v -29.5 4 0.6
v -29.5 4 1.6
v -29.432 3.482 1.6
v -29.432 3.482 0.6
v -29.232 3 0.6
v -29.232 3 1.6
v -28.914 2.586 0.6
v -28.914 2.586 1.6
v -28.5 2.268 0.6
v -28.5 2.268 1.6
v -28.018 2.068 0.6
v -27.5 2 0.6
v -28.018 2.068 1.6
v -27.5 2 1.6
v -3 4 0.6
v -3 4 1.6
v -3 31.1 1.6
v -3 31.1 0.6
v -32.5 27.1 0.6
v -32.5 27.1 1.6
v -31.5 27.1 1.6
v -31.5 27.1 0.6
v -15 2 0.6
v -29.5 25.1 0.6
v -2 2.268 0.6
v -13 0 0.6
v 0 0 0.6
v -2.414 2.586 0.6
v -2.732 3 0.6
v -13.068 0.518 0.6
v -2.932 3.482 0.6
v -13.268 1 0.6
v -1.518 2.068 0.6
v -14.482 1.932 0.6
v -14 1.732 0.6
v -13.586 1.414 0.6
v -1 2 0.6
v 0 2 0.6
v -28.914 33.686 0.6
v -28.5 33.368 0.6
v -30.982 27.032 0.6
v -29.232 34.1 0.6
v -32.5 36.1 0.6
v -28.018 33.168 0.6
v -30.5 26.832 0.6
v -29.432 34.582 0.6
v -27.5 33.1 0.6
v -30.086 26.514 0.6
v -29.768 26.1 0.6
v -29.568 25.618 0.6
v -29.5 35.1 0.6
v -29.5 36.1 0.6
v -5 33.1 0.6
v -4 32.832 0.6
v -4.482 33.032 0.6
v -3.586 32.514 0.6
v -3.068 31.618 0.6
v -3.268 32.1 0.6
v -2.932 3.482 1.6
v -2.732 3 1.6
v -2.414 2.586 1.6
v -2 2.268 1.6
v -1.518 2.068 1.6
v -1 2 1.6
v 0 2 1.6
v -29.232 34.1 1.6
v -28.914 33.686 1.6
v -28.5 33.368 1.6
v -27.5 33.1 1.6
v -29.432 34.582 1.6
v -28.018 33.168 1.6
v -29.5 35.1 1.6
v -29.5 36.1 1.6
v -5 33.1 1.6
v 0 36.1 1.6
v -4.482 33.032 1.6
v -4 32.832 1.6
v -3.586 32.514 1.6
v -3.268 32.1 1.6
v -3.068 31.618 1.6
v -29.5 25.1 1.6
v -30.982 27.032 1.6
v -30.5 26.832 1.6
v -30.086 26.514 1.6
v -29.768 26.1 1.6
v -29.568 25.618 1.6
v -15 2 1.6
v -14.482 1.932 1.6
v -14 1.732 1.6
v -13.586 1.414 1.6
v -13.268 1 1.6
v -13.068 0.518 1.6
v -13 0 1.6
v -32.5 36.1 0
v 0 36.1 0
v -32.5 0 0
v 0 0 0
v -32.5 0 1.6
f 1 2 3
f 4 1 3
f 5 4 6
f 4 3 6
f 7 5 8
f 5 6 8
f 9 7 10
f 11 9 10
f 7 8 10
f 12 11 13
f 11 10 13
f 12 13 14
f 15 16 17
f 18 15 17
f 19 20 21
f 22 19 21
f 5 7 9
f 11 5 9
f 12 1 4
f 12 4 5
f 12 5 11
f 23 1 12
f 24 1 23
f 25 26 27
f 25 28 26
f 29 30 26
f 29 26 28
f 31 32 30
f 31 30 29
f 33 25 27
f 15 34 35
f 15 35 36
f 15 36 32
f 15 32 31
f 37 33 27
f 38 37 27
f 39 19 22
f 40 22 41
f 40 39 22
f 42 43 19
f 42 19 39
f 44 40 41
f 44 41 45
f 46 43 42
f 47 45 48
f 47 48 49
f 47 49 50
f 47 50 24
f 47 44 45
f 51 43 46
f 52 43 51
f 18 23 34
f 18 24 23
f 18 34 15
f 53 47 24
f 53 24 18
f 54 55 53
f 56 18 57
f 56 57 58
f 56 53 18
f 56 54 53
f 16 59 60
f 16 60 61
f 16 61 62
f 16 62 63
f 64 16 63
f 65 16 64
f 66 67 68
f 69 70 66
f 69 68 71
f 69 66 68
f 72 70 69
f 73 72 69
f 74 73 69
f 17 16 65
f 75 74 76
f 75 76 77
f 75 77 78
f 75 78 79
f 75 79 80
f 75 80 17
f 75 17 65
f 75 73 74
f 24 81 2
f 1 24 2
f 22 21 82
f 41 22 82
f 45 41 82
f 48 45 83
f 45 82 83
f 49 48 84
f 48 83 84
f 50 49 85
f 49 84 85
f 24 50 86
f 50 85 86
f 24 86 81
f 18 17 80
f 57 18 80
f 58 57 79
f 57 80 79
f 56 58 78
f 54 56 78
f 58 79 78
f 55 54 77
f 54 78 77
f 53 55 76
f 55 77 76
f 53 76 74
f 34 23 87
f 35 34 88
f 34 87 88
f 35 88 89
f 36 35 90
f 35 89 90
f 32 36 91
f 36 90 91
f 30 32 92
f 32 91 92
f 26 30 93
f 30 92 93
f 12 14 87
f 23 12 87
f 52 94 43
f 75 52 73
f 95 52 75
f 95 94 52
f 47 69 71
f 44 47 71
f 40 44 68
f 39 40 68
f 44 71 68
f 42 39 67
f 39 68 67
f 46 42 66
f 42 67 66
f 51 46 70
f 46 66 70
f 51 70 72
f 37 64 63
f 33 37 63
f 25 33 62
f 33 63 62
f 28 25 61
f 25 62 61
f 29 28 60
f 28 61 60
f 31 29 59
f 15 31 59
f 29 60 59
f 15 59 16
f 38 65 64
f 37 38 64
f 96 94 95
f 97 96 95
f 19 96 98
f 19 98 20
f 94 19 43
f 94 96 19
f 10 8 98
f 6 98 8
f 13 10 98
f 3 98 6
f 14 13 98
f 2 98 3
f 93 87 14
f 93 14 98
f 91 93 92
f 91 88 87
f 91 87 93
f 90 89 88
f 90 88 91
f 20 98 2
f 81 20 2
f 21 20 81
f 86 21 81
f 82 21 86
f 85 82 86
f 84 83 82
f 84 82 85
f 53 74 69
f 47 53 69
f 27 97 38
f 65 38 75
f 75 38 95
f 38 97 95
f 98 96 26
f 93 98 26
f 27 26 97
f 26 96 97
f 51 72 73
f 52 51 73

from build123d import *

# Parameters (mm, degrees)
F0_W     = 32.5
F0_H     = 36.1
F1_DEPTH = 9.6
F3_DEPTH = 8
F4_DEPTH = 9


with BuildPart() as f1:
    # F0 (on Top) → F1 (new body)
    with BuildSketch(Plane.XY):
        with Locations((-16.25, 18.05)):
            Rectangle(F0_W, F0_H)
    extrude(amount=F1_DEPTH)

    # F2 (on face) → F3 (cut)
    with BuildSketch(Plane.XY.offset(9.6)):
        with BuildLine():
            Line((-32.5, 0), (-13, 0))
            ThreePointArc((-13, 0), (-13.585786, 1.414214), (-15, 2))
            Line((-15, 2), (-27.5, 2))
            ThreePointArc((-27.5, 2), (-28.914214, 2.585786), (-29.5, 4))
            Line((-29.5, 4), (-29.5, 25.1))
            ThreePointArc((-29.5, 25.1), (-30.085786, 26.514214), (-31.5, 27.1))
            Line((-31.5, 27.1), (-32.5, 27.1))
            Line((-32.5, 27.1), (-32.5, 0))
        make_face()
        with BuildLine():
            Line((-3, 31.1), (-3, 4))
            ThreePointArc((-3, 4), (-2.414214, 2.585786), (-1, 2))
            Line((-1, 2), (0, 2))
            Line((0, 2), (0, 36.1))
            Line((0, 36.1), (-29.5, 36.1))
            Line((-29.5, 36.1), (-29.5, 35.1))
            ThreePointArc((-29.5, 35.1), (-28.914214, 33.685786), (-27.5, 33.1))
            Line((-27.5, 33.1), (-5, 33.1))
            ThreePointArc((-5, 33.1), (-3.585786, 32.514214), (-3, 31.1))
        make_face()
    extrude(amount=-F3_DEPTH, mode=Mode.SUBTRACT)

    # F1_face (on face) → F4 (cut)
    with BuildSketch(Plane(origin=(-16.25, 18.05, 9.6), x_dir=(1, 0, 0), z_dir=(0, 0, 1))):
        with BuildLine():
            ThreePointArc((1.25, -16.05), (2.664214, -16.635786), (3.25, -18.05))
            Line((3.25, -18.05), (16.25, -18.05))
            Line((16.25, -18.05), (16.25, -16.05))
            Line((16.25, -16.05), (15.25, -16.05))
            ThreePointArc((15.25, -16.05), (13.835786, -15.464214), (13.25, -14.05))
            Line((13.25, -14.05), (13.25, 13.05))
            ThreePointArc((13.25, 13.05), (12.664214, 14.464214), (11.25, 15.05))
            Line((11.25, 15.05), (-11.25, 15.05))
            ThreePointArc((-11.25, 15.05), (-12.664214, 15.635786), (-13.25, 17.05))
            Line((-13.25, 17.05), (-13.25, 18.05))
            Line((-13.25, 18.05), (-16.25, 18.05))
            Line((-16.25, 18.05), (-16.25, 9.05))
            Line((-16.25, 9.05), (-15.25, 9.05))
            ThreePointArc((-15.25, 9.05), (-13.835786, 8.464214), (-13.25, 7.05))
            Line((-13.25, 7.05), (-13.25, -14.05))
            ThreePointArc((-13.25, -14.05), (-12.664214, -15.464214), (-11.25, -16.05))
            Line((-11.25, -16.05), (1.25, -16.05))
        make_face()
    extrude(amount=-F4_DEPTH, mode=Mode.SUBTRACT)


solid = f1.part
